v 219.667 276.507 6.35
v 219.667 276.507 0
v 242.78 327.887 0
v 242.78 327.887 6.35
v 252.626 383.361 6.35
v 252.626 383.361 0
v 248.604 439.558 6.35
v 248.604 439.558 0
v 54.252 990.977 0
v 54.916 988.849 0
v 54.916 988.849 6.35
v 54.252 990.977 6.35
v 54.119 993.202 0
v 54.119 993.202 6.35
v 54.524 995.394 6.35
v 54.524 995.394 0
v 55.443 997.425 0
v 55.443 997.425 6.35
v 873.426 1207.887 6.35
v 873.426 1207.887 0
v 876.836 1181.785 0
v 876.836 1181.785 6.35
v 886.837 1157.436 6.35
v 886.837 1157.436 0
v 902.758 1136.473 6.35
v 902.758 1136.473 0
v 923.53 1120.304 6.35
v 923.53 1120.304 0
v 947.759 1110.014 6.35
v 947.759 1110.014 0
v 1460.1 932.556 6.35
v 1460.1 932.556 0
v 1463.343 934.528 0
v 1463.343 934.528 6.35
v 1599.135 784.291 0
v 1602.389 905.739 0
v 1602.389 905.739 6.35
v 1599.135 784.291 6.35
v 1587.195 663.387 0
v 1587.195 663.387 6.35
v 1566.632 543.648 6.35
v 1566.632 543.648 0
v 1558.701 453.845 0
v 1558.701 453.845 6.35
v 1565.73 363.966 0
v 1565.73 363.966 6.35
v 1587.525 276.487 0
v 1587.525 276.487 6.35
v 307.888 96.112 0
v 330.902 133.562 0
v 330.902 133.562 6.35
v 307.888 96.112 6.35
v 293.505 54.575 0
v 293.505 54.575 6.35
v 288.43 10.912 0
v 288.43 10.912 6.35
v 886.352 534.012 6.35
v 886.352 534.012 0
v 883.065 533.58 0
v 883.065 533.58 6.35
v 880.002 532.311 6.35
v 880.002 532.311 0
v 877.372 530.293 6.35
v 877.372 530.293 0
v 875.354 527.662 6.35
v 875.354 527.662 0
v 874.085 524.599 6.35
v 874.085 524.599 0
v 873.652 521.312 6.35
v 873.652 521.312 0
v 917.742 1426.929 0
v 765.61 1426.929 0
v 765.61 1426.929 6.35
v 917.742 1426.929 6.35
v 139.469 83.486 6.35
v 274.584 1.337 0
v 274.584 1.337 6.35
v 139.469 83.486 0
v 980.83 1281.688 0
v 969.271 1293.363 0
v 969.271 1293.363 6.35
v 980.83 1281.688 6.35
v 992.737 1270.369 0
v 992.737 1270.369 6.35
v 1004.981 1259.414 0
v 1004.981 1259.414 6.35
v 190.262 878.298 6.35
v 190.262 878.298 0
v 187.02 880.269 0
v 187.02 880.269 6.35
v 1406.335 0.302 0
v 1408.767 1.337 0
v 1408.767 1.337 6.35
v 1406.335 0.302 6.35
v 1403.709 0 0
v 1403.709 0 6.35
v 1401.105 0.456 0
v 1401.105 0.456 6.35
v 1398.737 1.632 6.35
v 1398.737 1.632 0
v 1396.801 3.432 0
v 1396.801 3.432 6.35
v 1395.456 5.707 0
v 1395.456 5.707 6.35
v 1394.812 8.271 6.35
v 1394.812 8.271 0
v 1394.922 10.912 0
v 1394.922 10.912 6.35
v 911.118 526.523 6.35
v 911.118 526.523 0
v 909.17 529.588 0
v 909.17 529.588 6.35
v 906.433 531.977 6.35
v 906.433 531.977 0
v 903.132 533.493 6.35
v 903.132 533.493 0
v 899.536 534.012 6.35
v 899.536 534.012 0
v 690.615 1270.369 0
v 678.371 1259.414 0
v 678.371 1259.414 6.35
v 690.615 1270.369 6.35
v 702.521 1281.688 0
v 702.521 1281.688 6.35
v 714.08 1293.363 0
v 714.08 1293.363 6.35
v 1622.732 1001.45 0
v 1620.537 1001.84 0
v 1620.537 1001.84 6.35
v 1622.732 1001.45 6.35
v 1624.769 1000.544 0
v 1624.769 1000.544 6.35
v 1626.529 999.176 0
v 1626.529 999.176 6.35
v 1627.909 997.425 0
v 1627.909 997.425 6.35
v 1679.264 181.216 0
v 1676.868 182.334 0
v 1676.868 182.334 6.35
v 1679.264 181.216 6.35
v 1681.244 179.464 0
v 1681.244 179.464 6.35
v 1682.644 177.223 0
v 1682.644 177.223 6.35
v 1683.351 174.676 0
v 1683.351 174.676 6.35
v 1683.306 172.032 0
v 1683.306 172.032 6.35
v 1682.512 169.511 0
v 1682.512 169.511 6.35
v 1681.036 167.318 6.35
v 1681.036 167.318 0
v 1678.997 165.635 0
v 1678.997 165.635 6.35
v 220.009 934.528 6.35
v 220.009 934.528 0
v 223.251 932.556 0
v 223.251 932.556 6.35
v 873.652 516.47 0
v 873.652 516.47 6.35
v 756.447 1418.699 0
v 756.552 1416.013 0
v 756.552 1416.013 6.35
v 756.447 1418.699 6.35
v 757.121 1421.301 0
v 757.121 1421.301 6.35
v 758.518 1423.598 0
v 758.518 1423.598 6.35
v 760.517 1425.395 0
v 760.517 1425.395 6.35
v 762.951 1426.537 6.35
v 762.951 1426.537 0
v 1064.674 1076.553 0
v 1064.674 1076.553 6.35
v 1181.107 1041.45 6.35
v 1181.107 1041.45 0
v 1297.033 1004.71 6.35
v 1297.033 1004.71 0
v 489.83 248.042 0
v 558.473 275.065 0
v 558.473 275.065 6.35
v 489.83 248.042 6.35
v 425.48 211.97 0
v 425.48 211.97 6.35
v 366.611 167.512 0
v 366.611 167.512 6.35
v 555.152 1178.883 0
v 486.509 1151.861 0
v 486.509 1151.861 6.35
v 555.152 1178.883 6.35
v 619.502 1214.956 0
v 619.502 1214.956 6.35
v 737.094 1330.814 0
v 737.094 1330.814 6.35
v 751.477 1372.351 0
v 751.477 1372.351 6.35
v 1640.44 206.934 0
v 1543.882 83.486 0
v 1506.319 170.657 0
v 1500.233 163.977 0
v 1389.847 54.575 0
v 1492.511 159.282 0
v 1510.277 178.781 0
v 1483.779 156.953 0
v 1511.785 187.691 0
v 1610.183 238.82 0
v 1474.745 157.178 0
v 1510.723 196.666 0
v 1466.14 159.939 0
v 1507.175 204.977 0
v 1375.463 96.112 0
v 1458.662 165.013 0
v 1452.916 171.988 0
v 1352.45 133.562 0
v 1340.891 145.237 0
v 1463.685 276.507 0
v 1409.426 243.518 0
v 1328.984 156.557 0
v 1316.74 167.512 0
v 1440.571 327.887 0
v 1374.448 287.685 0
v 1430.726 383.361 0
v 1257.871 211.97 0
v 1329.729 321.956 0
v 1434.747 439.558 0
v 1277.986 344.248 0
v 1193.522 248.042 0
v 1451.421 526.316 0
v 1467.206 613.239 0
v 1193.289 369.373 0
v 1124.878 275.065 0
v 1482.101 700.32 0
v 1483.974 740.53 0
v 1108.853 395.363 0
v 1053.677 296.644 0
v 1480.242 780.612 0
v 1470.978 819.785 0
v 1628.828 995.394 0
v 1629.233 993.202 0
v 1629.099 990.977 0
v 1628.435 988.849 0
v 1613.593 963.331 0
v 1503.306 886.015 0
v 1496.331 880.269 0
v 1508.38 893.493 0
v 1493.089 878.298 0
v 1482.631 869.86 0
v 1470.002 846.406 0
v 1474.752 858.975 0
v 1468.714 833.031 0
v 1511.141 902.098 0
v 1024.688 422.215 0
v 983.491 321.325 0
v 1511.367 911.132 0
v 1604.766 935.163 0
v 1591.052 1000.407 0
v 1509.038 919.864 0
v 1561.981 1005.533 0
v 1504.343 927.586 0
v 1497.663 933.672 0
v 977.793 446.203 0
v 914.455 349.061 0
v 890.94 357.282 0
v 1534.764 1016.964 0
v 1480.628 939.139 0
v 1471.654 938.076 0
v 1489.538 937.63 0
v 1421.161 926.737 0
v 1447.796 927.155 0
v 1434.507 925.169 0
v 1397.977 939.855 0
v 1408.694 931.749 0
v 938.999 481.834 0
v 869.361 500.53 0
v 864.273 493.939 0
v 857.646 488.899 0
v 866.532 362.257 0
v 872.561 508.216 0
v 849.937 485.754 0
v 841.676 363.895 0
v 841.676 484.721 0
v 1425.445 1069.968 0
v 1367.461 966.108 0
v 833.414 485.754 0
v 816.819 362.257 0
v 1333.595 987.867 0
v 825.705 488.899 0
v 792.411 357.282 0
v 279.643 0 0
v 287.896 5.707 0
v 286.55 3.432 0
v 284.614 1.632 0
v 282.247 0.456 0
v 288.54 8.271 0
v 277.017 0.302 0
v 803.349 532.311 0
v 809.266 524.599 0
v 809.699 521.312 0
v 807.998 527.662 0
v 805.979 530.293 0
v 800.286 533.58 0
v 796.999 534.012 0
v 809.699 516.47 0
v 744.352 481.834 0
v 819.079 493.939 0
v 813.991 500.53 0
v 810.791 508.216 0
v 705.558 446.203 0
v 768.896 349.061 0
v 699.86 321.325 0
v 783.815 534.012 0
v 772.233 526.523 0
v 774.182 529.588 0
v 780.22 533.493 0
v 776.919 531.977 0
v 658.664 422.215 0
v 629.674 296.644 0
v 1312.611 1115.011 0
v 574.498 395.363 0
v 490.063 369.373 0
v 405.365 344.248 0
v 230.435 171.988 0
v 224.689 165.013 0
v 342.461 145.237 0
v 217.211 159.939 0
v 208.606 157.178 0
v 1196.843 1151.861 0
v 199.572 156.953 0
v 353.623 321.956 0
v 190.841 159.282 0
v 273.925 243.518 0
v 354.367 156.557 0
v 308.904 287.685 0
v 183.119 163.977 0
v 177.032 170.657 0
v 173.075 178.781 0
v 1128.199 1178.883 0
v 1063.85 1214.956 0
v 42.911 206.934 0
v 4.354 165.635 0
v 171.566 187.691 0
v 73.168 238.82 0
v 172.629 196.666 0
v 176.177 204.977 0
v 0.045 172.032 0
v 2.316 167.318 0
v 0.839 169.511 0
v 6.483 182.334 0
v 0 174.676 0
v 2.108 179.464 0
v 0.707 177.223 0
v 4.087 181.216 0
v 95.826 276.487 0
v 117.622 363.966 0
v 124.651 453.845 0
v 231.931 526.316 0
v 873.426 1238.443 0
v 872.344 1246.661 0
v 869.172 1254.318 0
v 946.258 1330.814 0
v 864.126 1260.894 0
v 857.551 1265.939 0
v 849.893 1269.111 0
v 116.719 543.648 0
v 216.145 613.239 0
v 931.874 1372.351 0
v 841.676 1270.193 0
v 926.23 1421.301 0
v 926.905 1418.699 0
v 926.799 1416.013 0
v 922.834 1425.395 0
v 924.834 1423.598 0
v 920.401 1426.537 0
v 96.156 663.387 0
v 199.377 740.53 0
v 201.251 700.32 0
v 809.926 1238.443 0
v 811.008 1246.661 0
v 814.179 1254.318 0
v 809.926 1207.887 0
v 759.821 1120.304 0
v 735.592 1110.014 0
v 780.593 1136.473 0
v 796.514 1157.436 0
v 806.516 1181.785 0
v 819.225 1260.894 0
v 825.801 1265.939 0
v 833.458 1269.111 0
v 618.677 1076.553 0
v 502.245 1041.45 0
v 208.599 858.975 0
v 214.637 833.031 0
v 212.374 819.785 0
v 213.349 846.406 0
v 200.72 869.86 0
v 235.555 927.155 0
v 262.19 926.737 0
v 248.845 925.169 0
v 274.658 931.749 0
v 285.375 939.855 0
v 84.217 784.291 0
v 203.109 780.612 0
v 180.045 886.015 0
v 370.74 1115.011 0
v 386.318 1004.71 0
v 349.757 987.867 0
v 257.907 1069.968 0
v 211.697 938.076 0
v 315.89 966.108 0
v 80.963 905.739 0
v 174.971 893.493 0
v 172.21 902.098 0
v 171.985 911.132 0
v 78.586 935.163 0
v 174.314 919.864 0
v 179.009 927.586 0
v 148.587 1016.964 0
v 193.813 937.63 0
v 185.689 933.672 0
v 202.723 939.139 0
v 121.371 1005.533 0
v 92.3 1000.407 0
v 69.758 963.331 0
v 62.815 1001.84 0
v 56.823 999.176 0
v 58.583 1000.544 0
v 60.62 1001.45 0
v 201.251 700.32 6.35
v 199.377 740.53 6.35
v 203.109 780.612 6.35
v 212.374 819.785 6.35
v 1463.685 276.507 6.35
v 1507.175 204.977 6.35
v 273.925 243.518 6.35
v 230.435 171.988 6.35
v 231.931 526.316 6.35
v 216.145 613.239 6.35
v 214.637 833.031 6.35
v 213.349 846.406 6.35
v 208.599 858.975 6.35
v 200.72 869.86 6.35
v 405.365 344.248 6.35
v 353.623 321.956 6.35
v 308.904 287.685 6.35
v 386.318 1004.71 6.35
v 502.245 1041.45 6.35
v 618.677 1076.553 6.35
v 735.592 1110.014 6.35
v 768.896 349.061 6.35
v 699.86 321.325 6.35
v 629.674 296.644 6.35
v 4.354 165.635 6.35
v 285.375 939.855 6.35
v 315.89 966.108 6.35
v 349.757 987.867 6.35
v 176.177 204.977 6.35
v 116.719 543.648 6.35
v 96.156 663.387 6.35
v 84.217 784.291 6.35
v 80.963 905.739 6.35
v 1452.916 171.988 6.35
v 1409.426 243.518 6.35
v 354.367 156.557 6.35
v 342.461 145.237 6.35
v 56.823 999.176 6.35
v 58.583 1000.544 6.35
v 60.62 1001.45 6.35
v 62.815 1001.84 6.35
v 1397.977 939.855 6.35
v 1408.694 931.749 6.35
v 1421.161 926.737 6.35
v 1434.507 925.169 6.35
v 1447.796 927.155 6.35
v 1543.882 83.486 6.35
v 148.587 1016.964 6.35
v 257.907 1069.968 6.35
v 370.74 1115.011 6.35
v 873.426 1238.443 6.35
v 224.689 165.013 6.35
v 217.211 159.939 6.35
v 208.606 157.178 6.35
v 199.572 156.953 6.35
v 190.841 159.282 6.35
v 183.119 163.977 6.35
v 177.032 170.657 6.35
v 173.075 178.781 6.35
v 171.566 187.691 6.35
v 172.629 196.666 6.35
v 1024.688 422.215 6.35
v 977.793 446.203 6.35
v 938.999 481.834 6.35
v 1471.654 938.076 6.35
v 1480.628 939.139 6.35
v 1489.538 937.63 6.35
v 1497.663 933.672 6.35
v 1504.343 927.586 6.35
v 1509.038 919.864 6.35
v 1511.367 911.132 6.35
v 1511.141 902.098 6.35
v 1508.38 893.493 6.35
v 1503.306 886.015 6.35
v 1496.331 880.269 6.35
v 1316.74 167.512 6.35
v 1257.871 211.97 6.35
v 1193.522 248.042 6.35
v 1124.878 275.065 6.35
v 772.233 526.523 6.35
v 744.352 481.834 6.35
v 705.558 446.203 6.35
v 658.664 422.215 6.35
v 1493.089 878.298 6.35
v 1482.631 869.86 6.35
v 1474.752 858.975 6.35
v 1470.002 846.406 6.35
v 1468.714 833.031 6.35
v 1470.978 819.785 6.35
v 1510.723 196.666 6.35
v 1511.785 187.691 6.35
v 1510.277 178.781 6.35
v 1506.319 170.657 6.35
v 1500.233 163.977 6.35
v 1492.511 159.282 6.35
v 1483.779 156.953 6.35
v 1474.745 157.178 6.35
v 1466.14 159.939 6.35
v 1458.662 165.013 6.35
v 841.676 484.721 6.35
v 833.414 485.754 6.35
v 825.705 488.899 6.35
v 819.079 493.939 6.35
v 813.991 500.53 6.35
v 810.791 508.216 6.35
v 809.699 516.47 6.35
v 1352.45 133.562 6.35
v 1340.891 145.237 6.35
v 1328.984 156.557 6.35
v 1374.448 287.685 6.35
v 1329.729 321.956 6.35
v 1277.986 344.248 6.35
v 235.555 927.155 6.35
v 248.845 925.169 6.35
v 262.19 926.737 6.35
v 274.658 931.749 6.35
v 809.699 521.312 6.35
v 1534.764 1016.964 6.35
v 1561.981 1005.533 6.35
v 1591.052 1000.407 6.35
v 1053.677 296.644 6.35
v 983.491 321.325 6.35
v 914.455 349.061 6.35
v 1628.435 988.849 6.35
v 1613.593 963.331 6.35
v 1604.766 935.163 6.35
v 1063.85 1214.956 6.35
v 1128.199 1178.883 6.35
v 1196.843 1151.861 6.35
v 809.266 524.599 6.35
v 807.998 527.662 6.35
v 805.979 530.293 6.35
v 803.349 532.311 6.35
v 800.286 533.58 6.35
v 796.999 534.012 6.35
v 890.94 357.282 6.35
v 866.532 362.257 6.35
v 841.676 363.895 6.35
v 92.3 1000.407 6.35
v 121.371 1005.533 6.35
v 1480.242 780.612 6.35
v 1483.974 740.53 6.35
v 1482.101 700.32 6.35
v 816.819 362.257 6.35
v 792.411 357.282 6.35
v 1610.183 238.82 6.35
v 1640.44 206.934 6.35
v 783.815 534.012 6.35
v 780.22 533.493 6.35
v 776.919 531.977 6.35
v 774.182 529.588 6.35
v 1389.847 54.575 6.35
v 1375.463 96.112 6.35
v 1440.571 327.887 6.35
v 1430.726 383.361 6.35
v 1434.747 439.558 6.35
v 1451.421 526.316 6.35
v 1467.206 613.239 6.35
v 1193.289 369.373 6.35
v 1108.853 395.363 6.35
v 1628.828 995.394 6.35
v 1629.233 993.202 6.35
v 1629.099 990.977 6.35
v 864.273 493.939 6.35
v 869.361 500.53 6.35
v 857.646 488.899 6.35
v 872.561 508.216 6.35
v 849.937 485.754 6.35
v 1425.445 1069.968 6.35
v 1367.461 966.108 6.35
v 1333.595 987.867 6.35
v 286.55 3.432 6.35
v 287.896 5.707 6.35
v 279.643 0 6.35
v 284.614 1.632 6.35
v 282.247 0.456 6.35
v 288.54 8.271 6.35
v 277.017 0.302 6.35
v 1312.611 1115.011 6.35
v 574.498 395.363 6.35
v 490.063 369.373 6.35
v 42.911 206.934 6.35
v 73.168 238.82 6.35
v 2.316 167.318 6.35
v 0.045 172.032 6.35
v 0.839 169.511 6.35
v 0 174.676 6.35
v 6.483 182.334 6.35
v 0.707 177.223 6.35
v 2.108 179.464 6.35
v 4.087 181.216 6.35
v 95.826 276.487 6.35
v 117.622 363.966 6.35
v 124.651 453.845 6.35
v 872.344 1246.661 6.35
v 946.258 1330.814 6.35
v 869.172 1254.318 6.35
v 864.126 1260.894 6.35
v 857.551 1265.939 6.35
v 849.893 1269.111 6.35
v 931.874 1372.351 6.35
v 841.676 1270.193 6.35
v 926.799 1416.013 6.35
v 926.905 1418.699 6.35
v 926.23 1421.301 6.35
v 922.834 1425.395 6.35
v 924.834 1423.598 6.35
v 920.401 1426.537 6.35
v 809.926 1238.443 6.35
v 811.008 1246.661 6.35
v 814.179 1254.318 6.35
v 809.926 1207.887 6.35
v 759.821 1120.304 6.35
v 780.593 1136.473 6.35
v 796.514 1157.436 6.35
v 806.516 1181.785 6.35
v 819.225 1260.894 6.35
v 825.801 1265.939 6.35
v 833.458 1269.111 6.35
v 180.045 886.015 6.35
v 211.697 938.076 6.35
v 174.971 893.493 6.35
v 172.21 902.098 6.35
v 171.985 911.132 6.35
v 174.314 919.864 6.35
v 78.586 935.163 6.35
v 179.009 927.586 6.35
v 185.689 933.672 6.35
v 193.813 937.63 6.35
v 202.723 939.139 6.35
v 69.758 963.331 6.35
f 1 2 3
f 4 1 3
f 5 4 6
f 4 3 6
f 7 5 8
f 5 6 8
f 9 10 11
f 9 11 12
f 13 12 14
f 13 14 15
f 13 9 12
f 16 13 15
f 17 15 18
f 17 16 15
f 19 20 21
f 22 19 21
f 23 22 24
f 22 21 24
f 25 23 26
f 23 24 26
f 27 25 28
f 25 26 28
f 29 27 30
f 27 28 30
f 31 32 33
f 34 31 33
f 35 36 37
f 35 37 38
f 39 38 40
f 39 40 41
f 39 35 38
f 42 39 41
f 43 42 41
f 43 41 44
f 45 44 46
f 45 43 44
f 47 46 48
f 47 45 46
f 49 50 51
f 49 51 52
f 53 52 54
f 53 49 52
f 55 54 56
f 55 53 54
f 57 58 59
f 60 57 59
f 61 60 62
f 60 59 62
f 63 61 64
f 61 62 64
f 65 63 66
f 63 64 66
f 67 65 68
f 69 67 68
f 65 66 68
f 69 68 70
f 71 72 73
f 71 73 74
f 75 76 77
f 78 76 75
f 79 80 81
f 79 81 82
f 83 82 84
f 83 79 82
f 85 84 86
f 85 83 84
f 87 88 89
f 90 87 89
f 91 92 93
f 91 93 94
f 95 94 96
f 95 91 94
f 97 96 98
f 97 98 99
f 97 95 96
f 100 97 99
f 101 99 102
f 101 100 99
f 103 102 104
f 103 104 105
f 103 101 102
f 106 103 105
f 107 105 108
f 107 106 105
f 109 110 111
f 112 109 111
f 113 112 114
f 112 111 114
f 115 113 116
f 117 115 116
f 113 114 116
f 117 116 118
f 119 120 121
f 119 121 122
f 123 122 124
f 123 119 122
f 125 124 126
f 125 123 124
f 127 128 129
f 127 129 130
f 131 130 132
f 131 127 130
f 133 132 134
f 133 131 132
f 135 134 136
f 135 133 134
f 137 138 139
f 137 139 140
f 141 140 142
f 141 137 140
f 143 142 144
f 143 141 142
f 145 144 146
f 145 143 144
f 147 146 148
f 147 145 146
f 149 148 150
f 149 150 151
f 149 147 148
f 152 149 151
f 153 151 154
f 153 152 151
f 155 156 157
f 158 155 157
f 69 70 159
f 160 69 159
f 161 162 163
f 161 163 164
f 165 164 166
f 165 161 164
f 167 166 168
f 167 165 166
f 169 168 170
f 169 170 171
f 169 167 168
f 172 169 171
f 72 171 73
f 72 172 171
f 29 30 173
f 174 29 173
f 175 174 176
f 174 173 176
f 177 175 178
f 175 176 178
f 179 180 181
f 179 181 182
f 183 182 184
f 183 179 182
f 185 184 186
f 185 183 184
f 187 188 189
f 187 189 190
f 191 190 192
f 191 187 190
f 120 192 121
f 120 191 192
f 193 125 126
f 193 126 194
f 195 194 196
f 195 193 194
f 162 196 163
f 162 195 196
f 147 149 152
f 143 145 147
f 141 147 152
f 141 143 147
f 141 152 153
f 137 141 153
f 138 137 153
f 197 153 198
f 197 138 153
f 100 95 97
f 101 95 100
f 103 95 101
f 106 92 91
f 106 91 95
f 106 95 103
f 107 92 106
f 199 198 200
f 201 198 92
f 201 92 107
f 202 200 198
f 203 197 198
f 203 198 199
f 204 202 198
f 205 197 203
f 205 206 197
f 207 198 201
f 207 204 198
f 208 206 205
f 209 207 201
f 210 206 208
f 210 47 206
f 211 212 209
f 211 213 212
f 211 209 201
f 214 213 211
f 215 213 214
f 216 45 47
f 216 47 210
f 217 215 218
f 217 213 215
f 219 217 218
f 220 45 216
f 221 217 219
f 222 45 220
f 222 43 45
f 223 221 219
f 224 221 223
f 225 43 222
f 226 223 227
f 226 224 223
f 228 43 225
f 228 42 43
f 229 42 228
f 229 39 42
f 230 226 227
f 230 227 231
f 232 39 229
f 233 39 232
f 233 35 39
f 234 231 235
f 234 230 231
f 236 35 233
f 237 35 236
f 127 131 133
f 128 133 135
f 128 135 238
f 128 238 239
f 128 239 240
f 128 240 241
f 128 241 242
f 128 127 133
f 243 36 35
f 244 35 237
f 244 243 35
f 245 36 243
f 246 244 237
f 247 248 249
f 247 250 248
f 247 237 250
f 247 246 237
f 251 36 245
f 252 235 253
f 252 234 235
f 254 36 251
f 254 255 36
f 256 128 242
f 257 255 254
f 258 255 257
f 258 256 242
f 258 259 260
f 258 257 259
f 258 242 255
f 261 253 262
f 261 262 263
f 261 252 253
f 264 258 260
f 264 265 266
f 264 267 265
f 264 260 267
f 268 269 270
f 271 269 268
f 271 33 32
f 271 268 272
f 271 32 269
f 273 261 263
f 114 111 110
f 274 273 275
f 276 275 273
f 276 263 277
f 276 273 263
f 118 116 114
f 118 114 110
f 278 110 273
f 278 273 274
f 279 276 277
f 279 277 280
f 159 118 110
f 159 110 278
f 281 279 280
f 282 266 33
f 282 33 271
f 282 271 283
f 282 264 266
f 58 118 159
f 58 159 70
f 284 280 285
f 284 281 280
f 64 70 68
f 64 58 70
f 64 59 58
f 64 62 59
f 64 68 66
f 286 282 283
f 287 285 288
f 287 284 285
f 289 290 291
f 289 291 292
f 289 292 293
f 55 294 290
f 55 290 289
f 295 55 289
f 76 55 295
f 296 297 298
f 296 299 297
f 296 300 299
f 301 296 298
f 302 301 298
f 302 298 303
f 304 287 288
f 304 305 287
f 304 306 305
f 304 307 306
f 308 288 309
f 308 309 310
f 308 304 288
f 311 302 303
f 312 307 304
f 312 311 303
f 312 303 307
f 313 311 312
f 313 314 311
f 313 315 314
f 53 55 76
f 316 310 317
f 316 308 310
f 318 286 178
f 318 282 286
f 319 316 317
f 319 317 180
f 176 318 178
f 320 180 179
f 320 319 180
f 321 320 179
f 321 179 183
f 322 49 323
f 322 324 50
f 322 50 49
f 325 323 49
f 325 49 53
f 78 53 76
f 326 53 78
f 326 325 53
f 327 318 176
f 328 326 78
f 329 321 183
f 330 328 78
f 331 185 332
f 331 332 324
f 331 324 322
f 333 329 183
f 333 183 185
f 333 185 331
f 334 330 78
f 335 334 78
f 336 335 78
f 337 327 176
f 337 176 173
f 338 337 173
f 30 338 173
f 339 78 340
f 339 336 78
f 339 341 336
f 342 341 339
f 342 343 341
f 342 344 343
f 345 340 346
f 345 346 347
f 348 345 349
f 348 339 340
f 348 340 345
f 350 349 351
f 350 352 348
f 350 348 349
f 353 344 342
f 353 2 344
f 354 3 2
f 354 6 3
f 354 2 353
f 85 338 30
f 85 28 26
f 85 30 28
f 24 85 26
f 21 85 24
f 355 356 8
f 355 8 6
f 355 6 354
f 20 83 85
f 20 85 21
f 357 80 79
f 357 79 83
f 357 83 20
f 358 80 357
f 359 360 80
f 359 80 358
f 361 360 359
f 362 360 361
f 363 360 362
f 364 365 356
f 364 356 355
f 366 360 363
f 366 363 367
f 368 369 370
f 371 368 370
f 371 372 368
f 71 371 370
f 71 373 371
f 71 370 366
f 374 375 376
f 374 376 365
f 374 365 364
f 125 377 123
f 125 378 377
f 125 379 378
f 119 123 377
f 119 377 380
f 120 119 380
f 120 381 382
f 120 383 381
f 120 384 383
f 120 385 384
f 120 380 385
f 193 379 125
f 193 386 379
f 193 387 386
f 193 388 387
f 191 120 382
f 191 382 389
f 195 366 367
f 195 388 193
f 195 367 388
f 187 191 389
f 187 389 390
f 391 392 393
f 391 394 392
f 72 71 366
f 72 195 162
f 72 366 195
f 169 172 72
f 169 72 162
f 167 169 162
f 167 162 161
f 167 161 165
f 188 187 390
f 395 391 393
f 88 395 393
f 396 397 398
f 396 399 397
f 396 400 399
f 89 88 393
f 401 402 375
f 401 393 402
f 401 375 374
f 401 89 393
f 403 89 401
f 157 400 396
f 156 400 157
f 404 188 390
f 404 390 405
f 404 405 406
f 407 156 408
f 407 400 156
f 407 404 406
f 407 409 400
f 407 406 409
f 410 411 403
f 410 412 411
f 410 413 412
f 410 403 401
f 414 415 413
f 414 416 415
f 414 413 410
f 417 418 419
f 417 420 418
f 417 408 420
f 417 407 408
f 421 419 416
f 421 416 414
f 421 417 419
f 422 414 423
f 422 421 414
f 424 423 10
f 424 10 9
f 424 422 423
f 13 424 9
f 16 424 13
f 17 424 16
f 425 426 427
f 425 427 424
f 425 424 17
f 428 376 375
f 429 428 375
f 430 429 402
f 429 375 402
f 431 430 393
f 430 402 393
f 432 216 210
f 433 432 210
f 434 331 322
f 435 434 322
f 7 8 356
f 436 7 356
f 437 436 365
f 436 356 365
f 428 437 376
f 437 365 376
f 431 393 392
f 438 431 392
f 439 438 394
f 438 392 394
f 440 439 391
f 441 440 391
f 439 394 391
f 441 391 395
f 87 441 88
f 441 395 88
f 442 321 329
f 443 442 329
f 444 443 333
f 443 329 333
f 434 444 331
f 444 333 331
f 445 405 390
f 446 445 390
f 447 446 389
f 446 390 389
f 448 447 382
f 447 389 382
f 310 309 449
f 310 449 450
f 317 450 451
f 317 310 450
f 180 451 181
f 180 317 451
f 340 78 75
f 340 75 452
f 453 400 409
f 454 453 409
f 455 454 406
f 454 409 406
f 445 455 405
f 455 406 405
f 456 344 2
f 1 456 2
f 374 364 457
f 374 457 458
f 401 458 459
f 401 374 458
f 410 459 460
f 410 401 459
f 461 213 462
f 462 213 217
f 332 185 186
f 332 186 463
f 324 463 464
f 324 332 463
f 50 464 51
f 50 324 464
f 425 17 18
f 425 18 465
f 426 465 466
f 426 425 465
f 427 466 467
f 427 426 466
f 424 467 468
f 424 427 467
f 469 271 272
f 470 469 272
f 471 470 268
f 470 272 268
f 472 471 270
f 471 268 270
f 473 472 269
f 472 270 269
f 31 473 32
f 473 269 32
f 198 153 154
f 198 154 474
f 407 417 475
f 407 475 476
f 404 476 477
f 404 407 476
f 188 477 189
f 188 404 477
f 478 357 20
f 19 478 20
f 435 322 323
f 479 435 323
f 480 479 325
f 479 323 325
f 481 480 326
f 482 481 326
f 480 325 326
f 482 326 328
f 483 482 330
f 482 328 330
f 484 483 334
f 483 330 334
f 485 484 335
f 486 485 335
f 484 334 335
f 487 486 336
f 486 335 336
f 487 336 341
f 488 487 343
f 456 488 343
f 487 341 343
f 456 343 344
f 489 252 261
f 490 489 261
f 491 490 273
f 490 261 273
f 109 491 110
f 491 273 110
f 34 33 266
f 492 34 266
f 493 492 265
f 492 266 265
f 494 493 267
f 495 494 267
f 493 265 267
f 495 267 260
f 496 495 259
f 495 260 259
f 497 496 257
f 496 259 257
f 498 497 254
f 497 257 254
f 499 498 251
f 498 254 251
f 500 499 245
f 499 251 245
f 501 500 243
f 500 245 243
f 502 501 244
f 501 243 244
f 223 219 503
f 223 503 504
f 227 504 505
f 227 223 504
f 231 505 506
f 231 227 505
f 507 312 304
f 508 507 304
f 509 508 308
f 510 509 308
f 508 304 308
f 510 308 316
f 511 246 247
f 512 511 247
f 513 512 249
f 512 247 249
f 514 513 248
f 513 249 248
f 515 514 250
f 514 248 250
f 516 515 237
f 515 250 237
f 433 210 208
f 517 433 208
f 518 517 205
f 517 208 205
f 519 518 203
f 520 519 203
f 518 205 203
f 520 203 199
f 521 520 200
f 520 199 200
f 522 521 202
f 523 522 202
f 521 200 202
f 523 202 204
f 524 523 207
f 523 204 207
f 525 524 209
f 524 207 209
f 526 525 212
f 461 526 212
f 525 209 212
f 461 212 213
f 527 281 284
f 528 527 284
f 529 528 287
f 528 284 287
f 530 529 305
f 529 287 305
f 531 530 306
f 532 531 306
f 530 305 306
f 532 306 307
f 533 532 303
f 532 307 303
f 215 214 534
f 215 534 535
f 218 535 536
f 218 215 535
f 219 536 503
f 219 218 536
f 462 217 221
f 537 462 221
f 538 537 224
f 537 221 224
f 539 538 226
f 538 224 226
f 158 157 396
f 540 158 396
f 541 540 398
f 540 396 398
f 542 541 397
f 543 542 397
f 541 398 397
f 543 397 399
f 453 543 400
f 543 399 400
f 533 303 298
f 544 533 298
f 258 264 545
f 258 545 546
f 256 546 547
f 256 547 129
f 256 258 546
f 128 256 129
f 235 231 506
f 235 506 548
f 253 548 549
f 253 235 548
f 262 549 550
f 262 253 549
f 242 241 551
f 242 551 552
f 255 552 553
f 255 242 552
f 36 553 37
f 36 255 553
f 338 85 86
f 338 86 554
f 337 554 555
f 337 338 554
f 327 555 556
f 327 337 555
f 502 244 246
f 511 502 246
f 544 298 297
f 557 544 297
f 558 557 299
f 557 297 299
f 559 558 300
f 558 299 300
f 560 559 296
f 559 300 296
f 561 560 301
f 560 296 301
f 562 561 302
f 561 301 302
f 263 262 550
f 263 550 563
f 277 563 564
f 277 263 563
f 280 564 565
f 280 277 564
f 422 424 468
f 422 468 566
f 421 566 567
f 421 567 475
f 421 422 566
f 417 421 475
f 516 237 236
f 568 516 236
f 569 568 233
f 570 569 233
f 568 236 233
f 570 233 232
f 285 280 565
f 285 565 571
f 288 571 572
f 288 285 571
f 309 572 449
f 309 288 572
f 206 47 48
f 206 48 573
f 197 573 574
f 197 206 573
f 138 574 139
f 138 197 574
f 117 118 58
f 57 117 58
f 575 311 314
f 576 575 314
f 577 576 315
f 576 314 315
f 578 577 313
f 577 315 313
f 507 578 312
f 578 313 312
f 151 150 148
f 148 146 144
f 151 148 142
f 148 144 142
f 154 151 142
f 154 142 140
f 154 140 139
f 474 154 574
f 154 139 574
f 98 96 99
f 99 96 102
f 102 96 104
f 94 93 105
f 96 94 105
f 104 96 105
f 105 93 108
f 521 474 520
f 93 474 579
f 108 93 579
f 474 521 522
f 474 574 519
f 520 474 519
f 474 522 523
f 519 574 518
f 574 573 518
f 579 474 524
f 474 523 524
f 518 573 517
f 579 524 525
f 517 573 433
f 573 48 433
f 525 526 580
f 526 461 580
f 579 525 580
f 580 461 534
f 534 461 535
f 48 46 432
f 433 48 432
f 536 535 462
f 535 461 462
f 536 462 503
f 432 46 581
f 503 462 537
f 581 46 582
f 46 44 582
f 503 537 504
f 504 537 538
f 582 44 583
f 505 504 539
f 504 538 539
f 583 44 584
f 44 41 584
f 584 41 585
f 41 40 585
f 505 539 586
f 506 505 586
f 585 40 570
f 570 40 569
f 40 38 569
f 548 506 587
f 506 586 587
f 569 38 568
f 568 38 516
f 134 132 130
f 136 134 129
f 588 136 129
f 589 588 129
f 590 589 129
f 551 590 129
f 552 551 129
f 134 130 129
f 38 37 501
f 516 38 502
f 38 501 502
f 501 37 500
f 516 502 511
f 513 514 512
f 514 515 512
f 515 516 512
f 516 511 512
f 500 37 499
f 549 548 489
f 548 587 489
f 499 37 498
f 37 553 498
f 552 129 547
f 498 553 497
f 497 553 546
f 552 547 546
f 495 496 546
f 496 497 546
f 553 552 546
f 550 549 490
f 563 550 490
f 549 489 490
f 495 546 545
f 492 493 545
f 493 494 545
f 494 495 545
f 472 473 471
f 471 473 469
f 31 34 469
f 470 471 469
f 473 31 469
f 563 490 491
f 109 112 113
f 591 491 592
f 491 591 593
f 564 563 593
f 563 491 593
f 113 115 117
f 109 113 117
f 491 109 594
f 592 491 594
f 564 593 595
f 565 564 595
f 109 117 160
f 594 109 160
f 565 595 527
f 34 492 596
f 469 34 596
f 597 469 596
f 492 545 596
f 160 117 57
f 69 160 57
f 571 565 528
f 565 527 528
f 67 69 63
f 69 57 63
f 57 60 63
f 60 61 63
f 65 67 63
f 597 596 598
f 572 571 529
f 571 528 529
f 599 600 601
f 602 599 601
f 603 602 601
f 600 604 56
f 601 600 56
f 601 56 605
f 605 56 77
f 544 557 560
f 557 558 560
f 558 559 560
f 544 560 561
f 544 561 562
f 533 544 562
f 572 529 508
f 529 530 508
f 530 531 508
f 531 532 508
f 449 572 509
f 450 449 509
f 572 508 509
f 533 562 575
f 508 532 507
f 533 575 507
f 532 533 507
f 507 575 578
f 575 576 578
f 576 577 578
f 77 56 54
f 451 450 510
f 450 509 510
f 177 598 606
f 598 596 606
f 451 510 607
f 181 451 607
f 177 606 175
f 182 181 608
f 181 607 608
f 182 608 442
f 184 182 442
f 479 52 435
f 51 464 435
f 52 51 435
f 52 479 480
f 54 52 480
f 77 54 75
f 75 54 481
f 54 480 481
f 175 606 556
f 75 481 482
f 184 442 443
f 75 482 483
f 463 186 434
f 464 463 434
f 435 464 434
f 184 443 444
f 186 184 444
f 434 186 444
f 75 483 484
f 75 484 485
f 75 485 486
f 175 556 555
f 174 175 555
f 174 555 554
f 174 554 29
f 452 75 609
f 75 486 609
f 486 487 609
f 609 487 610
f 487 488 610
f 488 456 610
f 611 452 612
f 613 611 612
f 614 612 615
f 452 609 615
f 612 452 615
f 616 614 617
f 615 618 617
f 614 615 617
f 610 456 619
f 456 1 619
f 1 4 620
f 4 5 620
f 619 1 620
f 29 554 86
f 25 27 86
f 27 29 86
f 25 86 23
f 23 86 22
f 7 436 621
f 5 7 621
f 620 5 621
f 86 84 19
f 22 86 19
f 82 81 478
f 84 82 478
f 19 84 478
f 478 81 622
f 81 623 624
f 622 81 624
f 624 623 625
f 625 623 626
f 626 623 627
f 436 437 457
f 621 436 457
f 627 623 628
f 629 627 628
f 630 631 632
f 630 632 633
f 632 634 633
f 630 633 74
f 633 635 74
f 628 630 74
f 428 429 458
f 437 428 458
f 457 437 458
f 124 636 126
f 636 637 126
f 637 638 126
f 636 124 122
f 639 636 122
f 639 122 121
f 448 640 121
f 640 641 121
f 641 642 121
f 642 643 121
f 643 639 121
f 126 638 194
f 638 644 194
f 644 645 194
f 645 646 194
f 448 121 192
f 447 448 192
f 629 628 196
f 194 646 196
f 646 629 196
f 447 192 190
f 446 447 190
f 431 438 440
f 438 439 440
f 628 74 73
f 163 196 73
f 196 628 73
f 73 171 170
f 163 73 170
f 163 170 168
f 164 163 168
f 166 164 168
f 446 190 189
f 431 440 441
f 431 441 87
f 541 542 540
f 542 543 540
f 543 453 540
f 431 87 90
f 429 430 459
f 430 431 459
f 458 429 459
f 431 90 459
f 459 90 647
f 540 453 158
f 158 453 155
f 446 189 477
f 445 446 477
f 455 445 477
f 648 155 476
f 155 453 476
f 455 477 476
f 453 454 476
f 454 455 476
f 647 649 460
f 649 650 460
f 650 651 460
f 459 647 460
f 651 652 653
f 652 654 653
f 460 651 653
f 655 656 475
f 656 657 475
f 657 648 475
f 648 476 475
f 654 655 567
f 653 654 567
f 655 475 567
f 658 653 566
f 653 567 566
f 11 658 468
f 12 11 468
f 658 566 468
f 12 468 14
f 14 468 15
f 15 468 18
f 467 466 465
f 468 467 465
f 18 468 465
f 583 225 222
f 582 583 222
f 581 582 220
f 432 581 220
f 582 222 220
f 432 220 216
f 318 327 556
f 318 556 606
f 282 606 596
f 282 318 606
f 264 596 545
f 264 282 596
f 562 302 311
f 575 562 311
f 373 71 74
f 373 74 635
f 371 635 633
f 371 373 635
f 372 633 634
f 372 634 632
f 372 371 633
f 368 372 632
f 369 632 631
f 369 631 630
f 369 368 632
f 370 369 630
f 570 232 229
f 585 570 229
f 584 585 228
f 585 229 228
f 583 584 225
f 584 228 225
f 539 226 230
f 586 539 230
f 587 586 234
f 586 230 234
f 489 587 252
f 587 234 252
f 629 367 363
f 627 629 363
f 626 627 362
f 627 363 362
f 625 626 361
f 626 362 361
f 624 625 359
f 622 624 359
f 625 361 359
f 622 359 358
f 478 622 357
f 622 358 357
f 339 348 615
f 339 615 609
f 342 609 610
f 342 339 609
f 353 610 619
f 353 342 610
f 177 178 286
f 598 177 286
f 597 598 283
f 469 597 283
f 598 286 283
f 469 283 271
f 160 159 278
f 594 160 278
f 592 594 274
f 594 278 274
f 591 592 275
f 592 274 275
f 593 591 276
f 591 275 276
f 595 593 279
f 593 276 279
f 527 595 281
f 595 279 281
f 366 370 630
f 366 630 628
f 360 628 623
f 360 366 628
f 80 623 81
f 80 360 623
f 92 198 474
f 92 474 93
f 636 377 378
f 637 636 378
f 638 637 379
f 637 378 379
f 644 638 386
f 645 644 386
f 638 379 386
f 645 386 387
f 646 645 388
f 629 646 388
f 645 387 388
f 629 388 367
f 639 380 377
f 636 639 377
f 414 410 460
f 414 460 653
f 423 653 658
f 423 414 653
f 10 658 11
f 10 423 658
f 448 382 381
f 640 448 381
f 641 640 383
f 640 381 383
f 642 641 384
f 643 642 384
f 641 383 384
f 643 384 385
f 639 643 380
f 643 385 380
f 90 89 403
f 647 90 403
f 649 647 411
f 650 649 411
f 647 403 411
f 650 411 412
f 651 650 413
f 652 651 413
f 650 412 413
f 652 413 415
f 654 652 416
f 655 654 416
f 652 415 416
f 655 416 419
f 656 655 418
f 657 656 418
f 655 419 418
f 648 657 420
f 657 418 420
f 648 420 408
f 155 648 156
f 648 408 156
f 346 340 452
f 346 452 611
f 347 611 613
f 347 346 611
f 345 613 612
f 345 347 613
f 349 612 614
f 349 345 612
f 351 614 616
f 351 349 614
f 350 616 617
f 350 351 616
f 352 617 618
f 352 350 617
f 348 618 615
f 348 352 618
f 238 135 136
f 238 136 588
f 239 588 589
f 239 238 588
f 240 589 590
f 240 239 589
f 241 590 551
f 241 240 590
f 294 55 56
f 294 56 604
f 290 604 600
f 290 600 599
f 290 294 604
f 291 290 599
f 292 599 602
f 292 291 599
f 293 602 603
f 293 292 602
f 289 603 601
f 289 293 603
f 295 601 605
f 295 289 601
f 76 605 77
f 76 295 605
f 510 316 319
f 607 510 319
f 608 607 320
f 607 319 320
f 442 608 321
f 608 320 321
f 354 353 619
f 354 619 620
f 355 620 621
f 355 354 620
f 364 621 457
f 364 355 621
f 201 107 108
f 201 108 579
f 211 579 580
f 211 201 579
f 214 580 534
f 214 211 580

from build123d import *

# Parameters (mm, degrees)
BOSS_EXTRUDE1_DEPTH = 6.35


with BuildPart() as part:
    # Model → Boss-Extrude1 (new body)
    with BuildSketch(Plane.XY):
        with BuildLine():
            Line((4.35423024, 165.635434247), (139.469217612, 83.486362243))
            Line((139.469217612, 83.486362243), (274.584204983, 1.33729024))
            ThreePointArc((274.584204983, 1.33729024), (284.613951479, 1.632058994), (288.42972151, 10.912285417))
            ThreePointArc((288.42972151, 10.912285417), (299.56530956, 75.734935389), (330.90150065, 133.562440942))
            ThreePointArc((330.90150065, 133.562440942), (348.371163031, 150.942054961), (366.610982668, 167.511577185))
            ThreePointArc((366.610982668, 167.511577185), (457.042015558, 231.099527282), (558.47317207, 275.064508752))
            ThreePointArc((558.47317207, 275.064508752), (664.902483594, 308.599892952), (768.896422643, 349.060750407))
            ThreePointArc((768.896422643, 349.060750407), (804.531090958, 360.181940267), (841.675709373, 363.895129261))
            ThreePointArc((841.675709373, 363.895129261), (878.82032779, 360.181940267), (914.454996104, 349.060750407))
            ThreePointArc((914.454996104, 349.060750407), (1018.448935155, 308.599892952), (1124.878246681, 275.064508752))
            ThreePointArc((1124.878246681, 275.064508752), (1226.309403191, 231.099527281), (1316.740436079, 167.511577185))
            ThreePointArc((1316.740436079, 167.511577185), (1334.980255717, 150.942054961), (1352.449918097, 133.562440942))
            ThreePointArc((1352.449918097, 133.562440942), (1383.786109187, 75.734935389), (1394.921697237, 10.912285417))
            ThreePointArc((1394.921697237, 10.912285417), (1398.737467268, 1.632058994), (1408.767213764, 1.33729024))
            Line((1408.767213764, 1.33729024), (1543.882201136, 83.486362243))
            Line((1543.882201136, 83.486362243), (1678.997188507, 165.635434247))
            ThreePointArc((1678.997188507, 165.635434247), (1683.351383353, 174.675549878), (1676.868448231, 182.334156514))
            ThreePointArc((1676.868448231, 182.334156514), (1624.443410929, 222.053078132), (1587.525422045, 276.486885341))
            ThreePointArc((1587.525422045, 276.486885341), (1560.34752833, 408.759091988), (1566.632287475, 543.648218164))
            ThreePointArc((1566.632287475, 543.648218164), (1594.247944771, 723.73196509), (1602.388911699, 905.738847083))
            ThreePointArc((1602.388911699, 905.738847083), (1608.393141444, 949.493417753), (1628.435079487, 988.848645472))
            ThreePointArc((1628.435079487, 988.848645472), (1629.232553539, 993.201988834), (1627.90862234, 997.425112023))
            ThreePointArc((1627.90862234, 997.425112023), (1624.76861318, 1000.544071106), (1620.536680372, 1001.839566375))
            ThreePointArc((1620.536680372, 1001.839566375), (1576.373215463, 1002.15830841), (1534.76442971, 1016.964461776))
            ThreePointArc((1534.76442971, 1016.964461776), (1369.431208537, 1093.500116289), (1196.84270997, 1151.860981578))
            ThreePointArc((1196.84270997, 1151.860981578), (1095.411553456, 1195.825963048), (1004.980520565, 1259.413913146))
            ThreePointArc((1004.980520565, 1259.413913146), (986.740700928, 1275.98343537), (969.271038547, 1293.363049389))
            ThreePointArc((969.271038547, 1293.363049389), (937.934847458, 1351.190554942), (926.799259407, 1416.013204913))
            ThreePointArc((926.799259407, 1416.013204913), (924.83388788, 1423.598388709), (917.741514416, 1426.92944516))
            Line((917.741514416, 1426.92944516), (841.675709374, 1426.92944516))
            Line((841.675709374, 1426.92944516), (765.609904332, 1426.92944516))
            ThreePointArc((765.609904332, 1426.92944516), (758.517530867, 1423.598388709), (756.55215934, 1416.013204913))
            ThreePointArc((756.55215934, 1416.013204913), (745.41657129, 1351.190554942), (714.0803802, 1293.363049389))
            ThreePointArc((714.0803802, 1293.363049389), (696.610717819, 1275.98343537), (678.370898182, 1259.413913146))
            ThreePointArc((678.370898182, 1259.413913146), (587.939865291, 1195.825963048), (486.508708777, 1151.860981578))
            ThreePointArc((486.508708777, 1151.860981578), (313.920210211, 1093.500116289), (148.58698904, 1016.964461777))
            ThreePointArc((148.58698904, 1016.964461777), (106.978203286, 1002.158308411), (62.814738375, 1001.839566375))
            ThreePointArc((62.814738375, 1001.839566375), (58.582805567, 1000.544071106), (55.442796407, 997.425112023))
            ThreePointArc((55.442796407, 997.425112023), (54.118865208, 993.201988834), (54.91633926, 988.848645472))
            ThreePointArc((54.91633926, 988.848645472), (74.958277304, 949.493417753), (80.962507049, 905.738847083))
            ThreePointArc((80.962507049, 905.738847083), (89.103473976, 723.73196509), (116.719131272, 543.648218164))
            ThreePointArc((116.719131272, 543.648218164), (123.003890417, 408.759091988), (95.825996702, 276.486885341))
            ThreePointArc((95.825996702, 276.486885341), (58.908007818, 222.053078132), (6.482970516, 182.334156514))
            ThreePointArc((6.482970516, 182.334156514), (3.5394e-05, 174.675549878), (4.35423024, 165.635434247))
        make_face()
        with BuildLine():
            ThreePointArc((230.435428938, 171.988006214), (186.811751564, 161.353168539), (176.176913889, 204.976845914))
            Line((176.176913889, 204.976845914), (219.666503461, 276.506507813))
            ThreePointArc((219.666503461, 276.506507813), (249.41858659, 355.319849433), (248.604010602, 439.557998355))
            ThreePointArc((248.604010602, 439.557998355), (223.92684494, 569.757162888), (201.250512588, 700.319672443))
            ThreePointArc((201.250512588, 700.319672443), (200.544706813, 760.636081732), (212.373594943, 819.785424898))
            ThreePointArc((212.373594943, 819.785424898), (211.391671526, 852.848321029), (190.262486725, 878.297816581))
            Line((190.262486725, 878.297816581), (187.019990651, 880.269234028))
            ThreePointArc((187.019990651, 880.269234028), (176.385152977, 923.892911403), (220.008830352, 934.527749077))
            Line((220.008830352, 934.527749077), (223.251326425, 932.55633163))
            ThreePointArc((223.251326425, 932.55633163), (255.569588474, 925.510111894), (285.374887402, 939.854568323))
            ThreePointArc((285.374887402, 939.854568323), (332.444064978, 977.578034675), (386.318088828, 1004.710247))
            ThreePointArc((386.318088828, 1004.710247), (560.399041188, 1059.206662677), (735.592244912, 1110.013932483))
            ThreePointArc((735.592244912, 1110.013932483), (789.235659351, 1146.436483903), (809.925709373, 1207.886788985))
            Line((809.925709373, 1207.886788985), (809.925709373, 1238.443064765))
            ThreePointArc((809.925709373, 1238.443064765), (819.225069071, 1260.893705067), (841.675709374, 1270.193064765))
            ThreePointArc((841.675709374, 1270.193064765), (864.126349676, 1260.893705067), (873.425709374, 1238.443064765))
            Line((873.425709374, 1238.443064765), (873.425709374, 1207.886788985))
            ThreePointArc((873.425709374, 1207.886788985), (894.115759397, 1146.436483903), (947.759173836, 1110.013932483))
            ThreePointArc((947.759173836, 1110.013932483), (1122.952377559, 1059.206662677), (1297.03332992, 1004.710247))
            ThreePointArc((1297.03332992, 1004.710247), (1350.907353769, 977.578034675), (1397.976531346, 939.854568323))
            ThreePointArc((1397.976531346, 939.854568323), (1427.781830274, 925.510111903), (1460.100092322, 932.55633163))
            Line((1460.100092322, 932.55633163), (1463.342588395, 934.527749077))
            ThreePointArc((1463.342588395, 934.527749077), (1506.96626577, 923.892911403), (1496.331428096, 880.269234028))
            Line((1496.331428096, 880.269234028), (1493.088932022, 878.297816581))
            ThreePointArc((1493.088932022, 878.297816581), (1471.959747212, 852.848321033), (1470.977823804, 819.785424898))
            ThreePointArc((1470.977823804, 819.785424898), (1482.806711935, 760.636081732), (1482.100906159, 700.319672443))
            ThreePointArc((1482.100906159, 700.319672443), (1459.424573808, 569.757162888), (1434.747408146, 439.557998355))
            ThreePointArc((1434.747408146, 439.557998355), (1433.932832157, 355.319849433), (1463.684915286, 276.506507814))
            Line((1463.684915286, 276.506507814), (1507.174504858, 204.976845914))
            ThreePointArc((1507.174504858, 204.976845914), (1496.539667184, 161.353168539), (1452.915989809, 171.988006214))
            Line((1452.915989809, 171.988006214), (1409.426400237, 243.517668114))
            ThreePointArc((1409.426400237, 243.517668114), (1353.148046842, 306.20320239), (1277.986129436, 344.248115849))
            ThreePointArc((1277.986129436, 344.248115849), (1151.037755853, 382.25989552), (1024.687626725, 422.215243331))
            ThreePointArc((1024.687626725, 422.215243331), (957.191769225, 462.706773525), (911.118304628, 526.522842482))
            ThreePointArc((911.118304628, 526.522842482), (906.432646334, 531.976812224), (899.536415282, 534.012291743))
            Line((899.536415282, 534.012291743), (886.352318699, 534.012291743))
            ThreePointArc((886.352318699, 534.012291743), (877.372062578, 530.292547864), (873.652318699, 521.312291743))
            Line((873.652318699, 521.312291743), (873.652318699, 516.47003269))
            ThreePointArc((873.652318699, 516.47003269), (864.272697037, 493.939416342), (841.675709374, 484.72084139))
            ThreePointArc((841.675709374, 484.72084139), (819.078721711, 493.939416342), (809.699100048, 516.47003269))
            Line((809.699100048, 516.47003269), (809.699100048, 521.312291743))
            ThreePointArc((809.699100048, 521.312291743), (805.979356169, 530.292547864), (796.999100048, 534.012291743))
            Line((796.999100048, 534.012291743), (783.815003465, 534.012291743))
            ThreePointArc((783.815003465, 534.012291743), (776.918772409, 531.97681223), (772.23311412, 526.522842482))
            ThreePointArc((772.23311412, 526.522842482), (726.159649523, 462.706773525), (658.663792022, 422.215243331))
            ThreePointArc((658.663792022, 422.215243331), (532.313662894, 382.25989552), (405.365289309, 344.248115848))
            ThreePointArc((405.365289309, 344.248115848), (330.203371904, 306.203202389), (273.92501851, 243.517668114))
            Line((273.92501851, 243.517668114), (230.435428938, 171.988006214))
        make_face(mode=Mode.SUBTRACT)
    extrude(amount=BOSS_EXTRUDE1_DEPTH)


solid = part.part
